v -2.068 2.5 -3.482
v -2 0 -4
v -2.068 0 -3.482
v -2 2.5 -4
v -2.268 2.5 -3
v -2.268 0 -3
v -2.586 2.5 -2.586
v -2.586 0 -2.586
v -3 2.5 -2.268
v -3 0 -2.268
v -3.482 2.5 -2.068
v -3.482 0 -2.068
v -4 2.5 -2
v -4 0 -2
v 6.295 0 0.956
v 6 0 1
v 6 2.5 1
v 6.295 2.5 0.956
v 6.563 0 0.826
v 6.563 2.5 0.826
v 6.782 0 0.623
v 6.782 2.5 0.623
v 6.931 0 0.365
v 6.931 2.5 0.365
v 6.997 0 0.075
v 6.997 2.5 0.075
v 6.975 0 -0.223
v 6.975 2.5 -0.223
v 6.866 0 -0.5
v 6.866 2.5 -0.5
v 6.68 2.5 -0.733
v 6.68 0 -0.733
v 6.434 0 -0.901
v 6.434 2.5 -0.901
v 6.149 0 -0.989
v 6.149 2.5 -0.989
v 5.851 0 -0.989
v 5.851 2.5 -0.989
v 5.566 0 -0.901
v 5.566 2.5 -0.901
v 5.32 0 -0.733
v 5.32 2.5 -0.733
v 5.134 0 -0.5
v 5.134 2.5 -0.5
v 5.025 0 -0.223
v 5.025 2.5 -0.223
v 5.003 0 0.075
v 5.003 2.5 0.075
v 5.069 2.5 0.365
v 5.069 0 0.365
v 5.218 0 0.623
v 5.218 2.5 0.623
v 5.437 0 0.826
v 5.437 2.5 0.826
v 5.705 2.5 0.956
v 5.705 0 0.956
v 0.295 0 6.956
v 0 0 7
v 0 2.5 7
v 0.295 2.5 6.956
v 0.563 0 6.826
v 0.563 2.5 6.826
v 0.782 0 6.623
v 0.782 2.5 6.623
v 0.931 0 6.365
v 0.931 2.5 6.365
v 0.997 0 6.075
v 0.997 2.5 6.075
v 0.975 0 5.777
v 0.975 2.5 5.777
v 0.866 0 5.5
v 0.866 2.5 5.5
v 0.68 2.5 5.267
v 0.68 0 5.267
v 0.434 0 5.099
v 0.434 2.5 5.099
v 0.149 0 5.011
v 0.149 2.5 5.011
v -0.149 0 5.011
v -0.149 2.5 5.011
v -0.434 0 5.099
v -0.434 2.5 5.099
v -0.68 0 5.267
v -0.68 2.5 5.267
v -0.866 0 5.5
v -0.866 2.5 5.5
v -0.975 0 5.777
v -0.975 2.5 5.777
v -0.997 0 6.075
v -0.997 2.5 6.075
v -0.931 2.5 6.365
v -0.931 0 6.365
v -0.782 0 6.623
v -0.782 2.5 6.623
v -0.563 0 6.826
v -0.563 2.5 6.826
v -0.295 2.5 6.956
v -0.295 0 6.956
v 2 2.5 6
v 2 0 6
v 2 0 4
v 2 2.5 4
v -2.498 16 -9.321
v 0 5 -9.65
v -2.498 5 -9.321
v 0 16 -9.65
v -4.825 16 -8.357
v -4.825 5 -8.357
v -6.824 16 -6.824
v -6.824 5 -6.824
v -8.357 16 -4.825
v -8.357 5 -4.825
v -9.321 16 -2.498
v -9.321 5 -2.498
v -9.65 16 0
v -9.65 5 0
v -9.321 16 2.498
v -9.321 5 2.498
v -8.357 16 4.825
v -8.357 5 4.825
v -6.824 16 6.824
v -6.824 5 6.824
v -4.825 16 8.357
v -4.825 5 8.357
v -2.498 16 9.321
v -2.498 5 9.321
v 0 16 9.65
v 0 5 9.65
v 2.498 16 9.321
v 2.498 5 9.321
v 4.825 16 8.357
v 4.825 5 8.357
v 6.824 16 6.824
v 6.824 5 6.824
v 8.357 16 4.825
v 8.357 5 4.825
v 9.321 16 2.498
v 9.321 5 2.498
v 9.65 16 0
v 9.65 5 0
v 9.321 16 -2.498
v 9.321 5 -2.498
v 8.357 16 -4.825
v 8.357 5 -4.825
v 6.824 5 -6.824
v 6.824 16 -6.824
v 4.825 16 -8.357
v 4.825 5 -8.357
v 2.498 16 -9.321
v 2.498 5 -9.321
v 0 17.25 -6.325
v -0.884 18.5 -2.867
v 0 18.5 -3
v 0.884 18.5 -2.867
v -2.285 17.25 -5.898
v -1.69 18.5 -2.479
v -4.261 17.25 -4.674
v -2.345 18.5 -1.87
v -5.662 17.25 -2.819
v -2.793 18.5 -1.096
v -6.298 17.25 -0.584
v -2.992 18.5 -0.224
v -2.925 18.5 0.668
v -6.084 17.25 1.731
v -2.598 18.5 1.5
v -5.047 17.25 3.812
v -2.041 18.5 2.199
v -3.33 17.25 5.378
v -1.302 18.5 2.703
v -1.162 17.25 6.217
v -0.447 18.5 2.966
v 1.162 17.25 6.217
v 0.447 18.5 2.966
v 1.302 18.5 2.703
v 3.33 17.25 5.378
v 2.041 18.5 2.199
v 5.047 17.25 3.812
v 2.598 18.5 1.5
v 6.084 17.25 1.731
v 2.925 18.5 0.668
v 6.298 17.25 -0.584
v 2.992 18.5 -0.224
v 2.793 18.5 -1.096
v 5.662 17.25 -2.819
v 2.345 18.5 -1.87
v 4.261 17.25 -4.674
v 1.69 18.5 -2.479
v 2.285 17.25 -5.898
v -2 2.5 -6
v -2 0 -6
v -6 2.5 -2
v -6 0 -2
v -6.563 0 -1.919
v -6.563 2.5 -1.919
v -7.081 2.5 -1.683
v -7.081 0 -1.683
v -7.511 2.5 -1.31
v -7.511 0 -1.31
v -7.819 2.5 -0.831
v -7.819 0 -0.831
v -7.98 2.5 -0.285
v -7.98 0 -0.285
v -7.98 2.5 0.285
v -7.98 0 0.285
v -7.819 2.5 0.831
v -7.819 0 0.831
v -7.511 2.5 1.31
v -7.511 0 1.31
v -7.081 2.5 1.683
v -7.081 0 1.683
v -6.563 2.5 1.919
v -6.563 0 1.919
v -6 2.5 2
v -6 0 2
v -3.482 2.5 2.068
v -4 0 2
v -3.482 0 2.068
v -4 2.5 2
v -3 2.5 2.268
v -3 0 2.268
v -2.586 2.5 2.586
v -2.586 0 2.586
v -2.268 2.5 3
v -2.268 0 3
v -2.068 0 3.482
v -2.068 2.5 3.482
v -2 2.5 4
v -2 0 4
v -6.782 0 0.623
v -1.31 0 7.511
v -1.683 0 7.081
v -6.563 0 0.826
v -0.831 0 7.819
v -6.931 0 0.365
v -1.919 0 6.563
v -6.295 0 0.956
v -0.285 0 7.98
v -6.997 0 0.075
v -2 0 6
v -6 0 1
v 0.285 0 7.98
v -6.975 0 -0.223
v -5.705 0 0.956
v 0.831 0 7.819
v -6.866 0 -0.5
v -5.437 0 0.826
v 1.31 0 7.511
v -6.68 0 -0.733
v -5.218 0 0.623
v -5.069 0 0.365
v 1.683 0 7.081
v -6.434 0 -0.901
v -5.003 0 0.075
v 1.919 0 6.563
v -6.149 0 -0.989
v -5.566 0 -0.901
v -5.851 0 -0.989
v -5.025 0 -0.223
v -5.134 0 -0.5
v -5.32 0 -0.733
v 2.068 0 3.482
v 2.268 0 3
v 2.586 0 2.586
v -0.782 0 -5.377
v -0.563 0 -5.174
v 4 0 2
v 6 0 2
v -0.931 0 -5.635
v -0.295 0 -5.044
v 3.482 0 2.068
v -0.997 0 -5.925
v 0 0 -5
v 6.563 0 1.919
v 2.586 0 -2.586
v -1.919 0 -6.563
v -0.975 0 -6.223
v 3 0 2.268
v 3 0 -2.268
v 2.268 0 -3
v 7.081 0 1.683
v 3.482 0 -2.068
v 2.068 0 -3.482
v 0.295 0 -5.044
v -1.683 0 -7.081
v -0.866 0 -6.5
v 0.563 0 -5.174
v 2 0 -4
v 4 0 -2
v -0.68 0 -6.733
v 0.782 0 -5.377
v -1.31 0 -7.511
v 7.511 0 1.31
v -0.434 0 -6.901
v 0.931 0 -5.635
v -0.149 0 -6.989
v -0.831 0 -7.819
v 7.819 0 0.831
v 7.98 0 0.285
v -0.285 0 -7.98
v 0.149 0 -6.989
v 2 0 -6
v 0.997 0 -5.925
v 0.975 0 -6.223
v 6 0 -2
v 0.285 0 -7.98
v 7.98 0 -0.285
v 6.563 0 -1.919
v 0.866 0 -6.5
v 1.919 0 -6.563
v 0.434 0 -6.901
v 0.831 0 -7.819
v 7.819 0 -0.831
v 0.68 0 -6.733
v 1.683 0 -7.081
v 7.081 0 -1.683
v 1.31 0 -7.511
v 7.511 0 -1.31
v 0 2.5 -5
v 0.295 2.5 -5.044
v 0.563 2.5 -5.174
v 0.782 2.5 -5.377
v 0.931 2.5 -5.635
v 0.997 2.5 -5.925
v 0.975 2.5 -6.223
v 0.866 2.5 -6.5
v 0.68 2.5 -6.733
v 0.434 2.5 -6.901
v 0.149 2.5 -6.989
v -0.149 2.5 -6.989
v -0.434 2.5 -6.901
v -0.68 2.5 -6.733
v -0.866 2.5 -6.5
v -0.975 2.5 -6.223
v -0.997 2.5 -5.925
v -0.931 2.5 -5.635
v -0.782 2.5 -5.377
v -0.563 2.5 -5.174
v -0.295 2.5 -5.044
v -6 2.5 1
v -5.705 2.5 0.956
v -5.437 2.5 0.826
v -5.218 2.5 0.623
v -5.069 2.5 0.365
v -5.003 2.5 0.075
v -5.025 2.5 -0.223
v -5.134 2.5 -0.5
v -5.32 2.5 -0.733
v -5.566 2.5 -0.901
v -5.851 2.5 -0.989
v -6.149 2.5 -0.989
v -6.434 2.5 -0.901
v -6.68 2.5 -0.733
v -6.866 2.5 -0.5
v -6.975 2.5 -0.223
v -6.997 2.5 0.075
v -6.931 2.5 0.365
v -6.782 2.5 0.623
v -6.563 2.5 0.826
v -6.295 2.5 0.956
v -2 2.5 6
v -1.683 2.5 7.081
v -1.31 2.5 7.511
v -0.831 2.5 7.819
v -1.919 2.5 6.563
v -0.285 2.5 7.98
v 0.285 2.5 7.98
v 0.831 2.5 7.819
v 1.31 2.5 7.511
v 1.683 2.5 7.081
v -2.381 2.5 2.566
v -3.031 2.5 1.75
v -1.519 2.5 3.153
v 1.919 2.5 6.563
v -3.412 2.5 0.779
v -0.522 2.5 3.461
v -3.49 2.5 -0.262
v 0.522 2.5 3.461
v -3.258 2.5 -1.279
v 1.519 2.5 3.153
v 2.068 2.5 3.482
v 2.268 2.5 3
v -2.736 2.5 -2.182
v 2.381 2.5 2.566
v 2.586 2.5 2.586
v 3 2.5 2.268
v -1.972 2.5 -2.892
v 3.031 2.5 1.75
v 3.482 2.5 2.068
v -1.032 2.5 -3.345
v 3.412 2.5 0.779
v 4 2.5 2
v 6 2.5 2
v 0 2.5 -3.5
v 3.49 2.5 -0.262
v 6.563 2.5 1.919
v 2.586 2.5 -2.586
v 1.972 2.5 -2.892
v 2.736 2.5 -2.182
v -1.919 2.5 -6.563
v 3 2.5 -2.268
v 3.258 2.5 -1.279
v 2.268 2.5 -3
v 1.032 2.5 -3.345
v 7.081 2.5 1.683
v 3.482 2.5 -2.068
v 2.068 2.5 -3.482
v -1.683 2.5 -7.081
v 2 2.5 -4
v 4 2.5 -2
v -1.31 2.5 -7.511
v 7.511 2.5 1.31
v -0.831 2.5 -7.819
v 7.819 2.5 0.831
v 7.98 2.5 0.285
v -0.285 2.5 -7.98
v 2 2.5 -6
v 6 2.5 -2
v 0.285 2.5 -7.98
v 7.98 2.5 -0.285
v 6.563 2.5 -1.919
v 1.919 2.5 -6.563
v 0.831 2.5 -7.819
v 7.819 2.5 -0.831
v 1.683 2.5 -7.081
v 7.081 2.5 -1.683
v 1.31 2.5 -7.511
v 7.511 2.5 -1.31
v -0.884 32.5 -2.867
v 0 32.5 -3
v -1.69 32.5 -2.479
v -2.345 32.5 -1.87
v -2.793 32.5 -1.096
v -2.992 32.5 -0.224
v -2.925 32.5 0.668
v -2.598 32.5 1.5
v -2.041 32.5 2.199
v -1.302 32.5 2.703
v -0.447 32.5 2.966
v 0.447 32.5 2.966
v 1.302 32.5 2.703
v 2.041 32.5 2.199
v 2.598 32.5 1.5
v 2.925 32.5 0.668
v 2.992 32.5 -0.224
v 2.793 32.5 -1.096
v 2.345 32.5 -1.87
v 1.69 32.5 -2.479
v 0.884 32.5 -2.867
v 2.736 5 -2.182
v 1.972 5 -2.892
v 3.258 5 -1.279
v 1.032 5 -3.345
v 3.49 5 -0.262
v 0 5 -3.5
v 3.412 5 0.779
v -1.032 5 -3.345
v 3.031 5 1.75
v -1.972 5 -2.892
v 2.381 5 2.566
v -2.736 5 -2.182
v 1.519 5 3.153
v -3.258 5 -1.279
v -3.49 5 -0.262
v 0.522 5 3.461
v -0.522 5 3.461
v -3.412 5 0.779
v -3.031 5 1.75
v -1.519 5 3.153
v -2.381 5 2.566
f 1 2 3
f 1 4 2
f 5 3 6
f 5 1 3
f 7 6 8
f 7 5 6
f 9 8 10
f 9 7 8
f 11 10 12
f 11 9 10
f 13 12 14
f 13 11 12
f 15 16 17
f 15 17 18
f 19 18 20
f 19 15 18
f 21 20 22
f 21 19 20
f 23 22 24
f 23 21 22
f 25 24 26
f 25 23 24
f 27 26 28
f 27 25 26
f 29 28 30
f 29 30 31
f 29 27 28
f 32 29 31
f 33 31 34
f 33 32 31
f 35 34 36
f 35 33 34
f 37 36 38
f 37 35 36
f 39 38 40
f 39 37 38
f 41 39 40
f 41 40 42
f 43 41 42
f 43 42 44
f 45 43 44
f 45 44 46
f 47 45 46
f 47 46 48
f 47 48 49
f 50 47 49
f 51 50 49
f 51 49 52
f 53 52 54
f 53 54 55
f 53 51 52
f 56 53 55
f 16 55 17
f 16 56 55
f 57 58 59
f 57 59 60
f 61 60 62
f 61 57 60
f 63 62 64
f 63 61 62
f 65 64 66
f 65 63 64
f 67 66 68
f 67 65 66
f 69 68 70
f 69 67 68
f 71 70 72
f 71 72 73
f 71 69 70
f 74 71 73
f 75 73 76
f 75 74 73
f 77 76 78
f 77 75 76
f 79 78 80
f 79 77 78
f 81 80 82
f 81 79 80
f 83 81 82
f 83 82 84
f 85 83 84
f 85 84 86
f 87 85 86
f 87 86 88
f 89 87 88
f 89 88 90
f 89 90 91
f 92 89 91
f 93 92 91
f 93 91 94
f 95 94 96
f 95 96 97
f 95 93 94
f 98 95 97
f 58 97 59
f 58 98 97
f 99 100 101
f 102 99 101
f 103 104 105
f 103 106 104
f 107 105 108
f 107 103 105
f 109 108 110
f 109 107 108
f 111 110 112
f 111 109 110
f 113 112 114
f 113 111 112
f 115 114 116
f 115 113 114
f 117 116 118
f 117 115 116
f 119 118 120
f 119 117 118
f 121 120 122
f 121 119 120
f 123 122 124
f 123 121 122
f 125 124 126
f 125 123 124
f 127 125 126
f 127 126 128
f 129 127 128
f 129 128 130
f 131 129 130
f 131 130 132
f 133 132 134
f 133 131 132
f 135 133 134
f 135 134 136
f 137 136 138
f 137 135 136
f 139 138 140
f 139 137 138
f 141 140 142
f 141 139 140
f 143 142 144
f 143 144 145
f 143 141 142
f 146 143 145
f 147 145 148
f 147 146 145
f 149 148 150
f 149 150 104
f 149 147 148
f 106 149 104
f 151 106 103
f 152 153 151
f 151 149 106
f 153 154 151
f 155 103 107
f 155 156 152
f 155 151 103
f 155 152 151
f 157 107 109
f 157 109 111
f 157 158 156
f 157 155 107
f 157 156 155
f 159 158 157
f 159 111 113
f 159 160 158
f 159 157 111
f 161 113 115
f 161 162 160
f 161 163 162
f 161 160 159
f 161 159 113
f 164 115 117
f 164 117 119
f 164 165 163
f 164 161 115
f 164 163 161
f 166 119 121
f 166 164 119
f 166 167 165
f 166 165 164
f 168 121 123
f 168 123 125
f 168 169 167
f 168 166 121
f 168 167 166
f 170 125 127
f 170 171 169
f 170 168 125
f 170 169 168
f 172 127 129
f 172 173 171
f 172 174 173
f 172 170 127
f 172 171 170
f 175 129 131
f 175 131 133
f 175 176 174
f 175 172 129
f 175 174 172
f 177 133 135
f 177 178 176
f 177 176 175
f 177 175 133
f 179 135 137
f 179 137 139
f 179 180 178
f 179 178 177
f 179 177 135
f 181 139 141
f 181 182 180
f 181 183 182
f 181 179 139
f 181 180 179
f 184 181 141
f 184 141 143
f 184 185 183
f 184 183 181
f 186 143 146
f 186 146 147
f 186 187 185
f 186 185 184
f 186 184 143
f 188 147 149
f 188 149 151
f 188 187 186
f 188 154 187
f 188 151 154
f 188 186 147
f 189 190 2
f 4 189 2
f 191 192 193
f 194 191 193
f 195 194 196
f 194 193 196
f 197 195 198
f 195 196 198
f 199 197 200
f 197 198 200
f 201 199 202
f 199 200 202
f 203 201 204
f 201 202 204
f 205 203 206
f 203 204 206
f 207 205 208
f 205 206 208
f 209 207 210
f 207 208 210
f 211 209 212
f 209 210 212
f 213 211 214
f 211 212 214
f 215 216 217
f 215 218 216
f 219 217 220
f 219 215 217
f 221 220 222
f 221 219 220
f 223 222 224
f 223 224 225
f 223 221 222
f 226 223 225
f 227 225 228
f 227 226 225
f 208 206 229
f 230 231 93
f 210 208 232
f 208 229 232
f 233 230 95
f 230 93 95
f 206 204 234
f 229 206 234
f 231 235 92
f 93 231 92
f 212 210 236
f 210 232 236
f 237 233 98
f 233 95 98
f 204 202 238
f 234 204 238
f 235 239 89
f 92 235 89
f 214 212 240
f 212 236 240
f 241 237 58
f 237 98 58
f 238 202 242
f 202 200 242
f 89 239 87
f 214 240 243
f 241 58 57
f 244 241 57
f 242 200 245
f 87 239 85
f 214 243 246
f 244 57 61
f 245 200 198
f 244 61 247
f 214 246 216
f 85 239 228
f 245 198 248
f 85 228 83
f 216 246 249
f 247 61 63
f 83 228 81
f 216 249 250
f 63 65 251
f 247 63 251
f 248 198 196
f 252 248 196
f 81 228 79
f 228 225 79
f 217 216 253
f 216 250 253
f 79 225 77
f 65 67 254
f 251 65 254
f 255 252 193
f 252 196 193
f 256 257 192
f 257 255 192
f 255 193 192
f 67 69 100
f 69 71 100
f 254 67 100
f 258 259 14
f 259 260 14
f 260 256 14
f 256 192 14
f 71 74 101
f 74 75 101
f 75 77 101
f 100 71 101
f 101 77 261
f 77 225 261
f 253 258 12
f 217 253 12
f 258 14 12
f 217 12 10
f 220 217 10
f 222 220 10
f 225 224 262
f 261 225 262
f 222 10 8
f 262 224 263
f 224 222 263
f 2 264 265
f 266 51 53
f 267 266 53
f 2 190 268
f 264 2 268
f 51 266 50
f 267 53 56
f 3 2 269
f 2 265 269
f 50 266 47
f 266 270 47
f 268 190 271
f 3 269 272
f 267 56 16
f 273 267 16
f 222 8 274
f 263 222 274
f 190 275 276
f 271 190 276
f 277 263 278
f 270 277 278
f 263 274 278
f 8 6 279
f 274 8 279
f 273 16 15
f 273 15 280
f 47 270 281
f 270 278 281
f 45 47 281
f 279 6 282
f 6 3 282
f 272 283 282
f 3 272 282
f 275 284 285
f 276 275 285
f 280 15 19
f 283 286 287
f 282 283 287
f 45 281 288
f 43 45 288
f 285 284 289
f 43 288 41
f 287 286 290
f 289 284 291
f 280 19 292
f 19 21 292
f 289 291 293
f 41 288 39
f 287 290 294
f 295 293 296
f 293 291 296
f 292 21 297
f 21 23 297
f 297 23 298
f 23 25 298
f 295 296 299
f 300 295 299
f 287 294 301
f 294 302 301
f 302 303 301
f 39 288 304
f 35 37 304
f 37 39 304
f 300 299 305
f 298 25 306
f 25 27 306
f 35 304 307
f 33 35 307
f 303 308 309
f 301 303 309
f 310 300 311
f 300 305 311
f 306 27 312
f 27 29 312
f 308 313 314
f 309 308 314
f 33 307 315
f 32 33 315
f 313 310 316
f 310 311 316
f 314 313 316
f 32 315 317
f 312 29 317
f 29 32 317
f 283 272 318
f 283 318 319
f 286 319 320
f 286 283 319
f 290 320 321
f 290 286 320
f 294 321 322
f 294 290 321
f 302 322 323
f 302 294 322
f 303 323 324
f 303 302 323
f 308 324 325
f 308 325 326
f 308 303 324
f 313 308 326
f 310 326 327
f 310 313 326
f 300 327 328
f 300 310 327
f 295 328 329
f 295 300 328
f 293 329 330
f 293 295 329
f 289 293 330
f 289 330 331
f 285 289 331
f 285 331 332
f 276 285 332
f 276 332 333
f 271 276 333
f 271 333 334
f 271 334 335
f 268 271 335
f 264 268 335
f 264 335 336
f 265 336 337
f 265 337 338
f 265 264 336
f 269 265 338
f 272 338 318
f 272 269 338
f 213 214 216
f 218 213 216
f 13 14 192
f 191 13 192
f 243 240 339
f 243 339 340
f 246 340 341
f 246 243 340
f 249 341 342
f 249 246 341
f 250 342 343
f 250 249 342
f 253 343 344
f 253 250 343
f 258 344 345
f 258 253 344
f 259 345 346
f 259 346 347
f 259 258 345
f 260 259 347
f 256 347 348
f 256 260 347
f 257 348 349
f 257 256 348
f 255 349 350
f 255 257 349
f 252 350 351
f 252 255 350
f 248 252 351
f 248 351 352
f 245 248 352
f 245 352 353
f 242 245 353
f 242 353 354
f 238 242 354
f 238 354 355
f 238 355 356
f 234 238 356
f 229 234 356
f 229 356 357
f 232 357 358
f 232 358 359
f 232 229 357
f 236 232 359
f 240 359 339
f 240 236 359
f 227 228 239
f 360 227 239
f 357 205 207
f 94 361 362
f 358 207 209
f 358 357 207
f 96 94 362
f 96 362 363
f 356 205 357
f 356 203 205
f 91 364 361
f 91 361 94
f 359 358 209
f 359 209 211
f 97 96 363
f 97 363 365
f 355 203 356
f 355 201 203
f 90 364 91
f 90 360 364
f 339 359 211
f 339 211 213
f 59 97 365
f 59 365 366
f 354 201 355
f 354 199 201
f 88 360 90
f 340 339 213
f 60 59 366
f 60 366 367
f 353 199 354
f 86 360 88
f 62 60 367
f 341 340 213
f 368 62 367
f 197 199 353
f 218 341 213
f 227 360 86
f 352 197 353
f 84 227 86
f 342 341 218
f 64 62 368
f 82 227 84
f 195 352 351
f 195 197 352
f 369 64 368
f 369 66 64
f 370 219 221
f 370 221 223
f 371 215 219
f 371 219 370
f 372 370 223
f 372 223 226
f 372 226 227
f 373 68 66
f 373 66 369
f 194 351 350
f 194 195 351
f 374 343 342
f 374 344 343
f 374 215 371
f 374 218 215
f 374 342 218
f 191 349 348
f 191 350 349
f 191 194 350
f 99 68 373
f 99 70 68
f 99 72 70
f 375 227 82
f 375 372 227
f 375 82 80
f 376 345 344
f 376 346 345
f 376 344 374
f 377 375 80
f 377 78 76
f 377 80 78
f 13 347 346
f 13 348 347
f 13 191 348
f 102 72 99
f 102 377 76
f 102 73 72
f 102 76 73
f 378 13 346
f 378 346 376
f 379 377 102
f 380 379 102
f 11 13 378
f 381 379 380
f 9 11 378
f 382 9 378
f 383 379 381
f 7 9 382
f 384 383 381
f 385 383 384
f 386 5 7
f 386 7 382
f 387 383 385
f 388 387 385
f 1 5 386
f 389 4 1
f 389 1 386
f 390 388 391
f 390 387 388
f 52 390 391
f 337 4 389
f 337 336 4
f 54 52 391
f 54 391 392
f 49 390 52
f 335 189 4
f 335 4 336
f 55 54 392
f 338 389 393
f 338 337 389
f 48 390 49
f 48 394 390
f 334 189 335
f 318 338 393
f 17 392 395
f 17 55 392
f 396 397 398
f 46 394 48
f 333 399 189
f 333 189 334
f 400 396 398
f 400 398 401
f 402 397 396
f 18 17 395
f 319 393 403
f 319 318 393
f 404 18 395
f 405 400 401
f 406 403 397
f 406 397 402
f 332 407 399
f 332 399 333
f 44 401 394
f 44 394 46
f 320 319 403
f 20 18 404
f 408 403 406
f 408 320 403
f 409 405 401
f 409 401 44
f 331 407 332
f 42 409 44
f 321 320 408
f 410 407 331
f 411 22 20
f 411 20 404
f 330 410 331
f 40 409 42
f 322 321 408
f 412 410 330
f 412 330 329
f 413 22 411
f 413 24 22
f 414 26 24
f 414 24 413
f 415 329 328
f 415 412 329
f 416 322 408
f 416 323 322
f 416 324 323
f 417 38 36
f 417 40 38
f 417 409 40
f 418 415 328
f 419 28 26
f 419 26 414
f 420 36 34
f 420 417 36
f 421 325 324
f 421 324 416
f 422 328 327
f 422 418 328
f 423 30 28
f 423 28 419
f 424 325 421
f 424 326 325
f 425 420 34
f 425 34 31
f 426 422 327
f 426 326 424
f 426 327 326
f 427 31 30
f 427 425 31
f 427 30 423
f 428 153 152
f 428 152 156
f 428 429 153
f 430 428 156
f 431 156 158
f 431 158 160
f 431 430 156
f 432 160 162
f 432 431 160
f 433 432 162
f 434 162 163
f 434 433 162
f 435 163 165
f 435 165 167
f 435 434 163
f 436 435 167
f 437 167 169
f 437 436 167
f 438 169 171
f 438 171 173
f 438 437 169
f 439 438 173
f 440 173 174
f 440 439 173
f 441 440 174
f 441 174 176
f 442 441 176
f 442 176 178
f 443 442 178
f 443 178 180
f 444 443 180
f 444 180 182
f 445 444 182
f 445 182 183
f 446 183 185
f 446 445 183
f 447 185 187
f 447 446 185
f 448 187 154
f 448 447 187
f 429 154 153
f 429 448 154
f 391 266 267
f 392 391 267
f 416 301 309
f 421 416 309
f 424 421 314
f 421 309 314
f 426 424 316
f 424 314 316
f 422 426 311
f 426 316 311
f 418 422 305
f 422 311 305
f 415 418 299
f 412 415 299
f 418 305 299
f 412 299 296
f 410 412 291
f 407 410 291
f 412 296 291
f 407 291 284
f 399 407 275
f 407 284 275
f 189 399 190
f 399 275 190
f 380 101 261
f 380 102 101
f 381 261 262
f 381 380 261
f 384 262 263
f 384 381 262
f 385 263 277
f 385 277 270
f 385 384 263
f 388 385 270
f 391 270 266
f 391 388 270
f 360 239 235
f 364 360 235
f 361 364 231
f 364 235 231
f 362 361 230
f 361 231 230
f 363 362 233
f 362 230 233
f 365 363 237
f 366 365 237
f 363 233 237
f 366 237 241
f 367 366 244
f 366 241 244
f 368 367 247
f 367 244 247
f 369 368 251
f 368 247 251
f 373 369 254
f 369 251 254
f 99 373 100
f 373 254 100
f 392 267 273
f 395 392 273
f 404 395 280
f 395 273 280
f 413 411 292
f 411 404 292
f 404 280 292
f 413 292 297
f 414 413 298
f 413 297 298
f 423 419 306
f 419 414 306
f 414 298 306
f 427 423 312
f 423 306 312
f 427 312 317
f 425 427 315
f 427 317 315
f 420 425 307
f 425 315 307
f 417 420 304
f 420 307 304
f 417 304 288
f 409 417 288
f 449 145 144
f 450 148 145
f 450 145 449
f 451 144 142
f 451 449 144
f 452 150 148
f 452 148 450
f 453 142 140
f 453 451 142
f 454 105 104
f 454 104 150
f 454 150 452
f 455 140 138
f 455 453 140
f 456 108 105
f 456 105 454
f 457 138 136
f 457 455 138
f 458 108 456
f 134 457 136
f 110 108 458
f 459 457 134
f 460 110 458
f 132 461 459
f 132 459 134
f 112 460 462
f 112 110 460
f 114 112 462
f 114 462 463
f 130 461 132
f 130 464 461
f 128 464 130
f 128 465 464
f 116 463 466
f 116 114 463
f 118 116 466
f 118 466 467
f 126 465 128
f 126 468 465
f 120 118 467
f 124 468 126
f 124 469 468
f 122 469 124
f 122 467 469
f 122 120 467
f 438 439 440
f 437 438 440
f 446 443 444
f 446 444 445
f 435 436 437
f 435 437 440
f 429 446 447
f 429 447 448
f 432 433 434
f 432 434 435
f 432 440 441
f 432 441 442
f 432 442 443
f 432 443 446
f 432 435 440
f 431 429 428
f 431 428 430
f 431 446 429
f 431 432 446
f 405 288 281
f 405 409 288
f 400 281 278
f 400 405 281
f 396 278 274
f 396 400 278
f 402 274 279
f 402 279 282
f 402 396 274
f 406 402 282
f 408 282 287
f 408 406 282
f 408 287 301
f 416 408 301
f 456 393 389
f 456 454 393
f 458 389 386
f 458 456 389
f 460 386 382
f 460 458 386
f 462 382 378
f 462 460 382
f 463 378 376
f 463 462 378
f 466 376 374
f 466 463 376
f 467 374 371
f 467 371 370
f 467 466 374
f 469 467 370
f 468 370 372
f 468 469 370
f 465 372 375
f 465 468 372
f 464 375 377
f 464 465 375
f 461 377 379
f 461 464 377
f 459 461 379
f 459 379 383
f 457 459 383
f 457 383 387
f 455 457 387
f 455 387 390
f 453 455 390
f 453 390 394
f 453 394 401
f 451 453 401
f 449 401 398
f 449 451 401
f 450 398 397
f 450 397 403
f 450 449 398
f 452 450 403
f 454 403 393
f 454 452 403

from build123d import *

# Parameters (mm, degrees)
SKETCH1_W           = 4
SKETCH1_H           = 4
SKETCH1_R           = 2
SKETCH1_R_2         = 1
BOSS_EXTRUDE1_DEPTH = 2.5
FILLET1_R           = 2


with BuildPart() as part:
    # Sketch1 → Boss-Extrude1 (new body)
    # profile 1 of 9: a face of its own
    with BuildSketch(Plane(origin=(0, 0, 0), x_dir=(1, 0, 0), z_dir=(0, 1, 0))):
        Rectangle(SKETCH1_W, SKETCH1_H)
    # profile 2 of 9: a face of its own
    with BuildSketch(Plane(origin=(0, 0, 0), x_dir=(1, 0, 0), z_dir=(0, 1, 0))):
        with BuildLine():
            ThreePointArc((-4, 0), (-4.585786438, -1.414213562), (-6, -2))
            Line((-6, -2), (-2, -2))
            Line((-2, -2), (-2, 2))
            Line((-2, 2), (-6, 2))
            ThreePointArc((-6, 2), (-4.585786438, 1.414213562), (-4, 0))
        make_face()
    # profile 3 of 9: a face of its own
    with BuildSketch(Plane(origin=(0, 0, 0), x_dir=(1, 0, 0), z_dir=(0, 1, 0))):
        with Locations((-6, 0)):
            Circle(SKETCH1_R)
        with Locations(Location((-6, 0, 0), (0, 0, 270))):
            Circle(SKETCH1_R_2, mode=Mode.SUBTRACT)
    # profile 4 of 9: a face of its own
    with BuildSketch(Plane(origin=(0, 0, 0), x_dir=(1, 0, 0), z_dir=(0, 1, 0))):
        with Locations((0, -6)):
            Circle(SKETCH1_R)
        with Locations(Location((0, -6, 0), (0, 0, 270))):
            Circle(SKETCH1_R_2, mode=Mode.SUBTRACT)
    # profile 5 of 9: a face of its own
    with BuildSketch(Plane(origin=(0, 0, 0), x_dir=(1, 0, 0), z_dir=(0, 1, 0))):
        with BuildLine():
            Line((2, -2), (-2, -2))
            Line((-2, -2), (-2, -6))
            ThreePointArc((-2, -6), (0, -4), (2, -6))
            Line((2, -6), (2, -2))
        make_face()
    # profile 6 of 9: a face of its own
    with BuildSketch(Plane(origin=(0, 0, 0), x_dir=(1, 0, 0), z_dir=(0, 1, 0))):
        with BuildLine():
            Line((-2, 6), (-2, 2))
            Line((-2, 2), (2, 2))
            Line((2, 2), (2, 6))
            ThreePointArc((2, 6), (0, 4), (-2, 6))
        make_face()
    # profile 7 of 9: a face of its own
    with BuildSketch(Plane(origin=(0, 0, 0), x_dir=(1, 0, 0), z_dir=(0, 1, 0))):
        with Locations((0, 6)):
            Circle(SKETCH1_R)
        with Locations(Location((0, 6, 0), (0, 0, 270))):
            Circle(SKETCH1_R_2, mode=Mode.SUBTRACT)
    # profile 8 of 9: a face of its own
    with BuildSketch(Plane(origin=(0, 0, 0), x_dir=(1, 0, 0), z_dir=(0, 1, 0))):
        with BuildLine():
            Line((2, 2), (2, -2))
            Line((2, -2), (6, -2))
            ThreePointArc((6, -2), (4, 0), (6, 2))
            Line((6, 2), (2, 2))
        make_face()
    # profile 9 of 9: a face of its own
    with BuildSketch(Plane(origin=(0, 0, 0), x_dir=(1, 0, 0), z_dir=(0, 1, 0))):
        with Locations((6, 0)):
            Circle(SKETCH1_R)
        with Locations(Location((6, 0, 0), (0, 0, 270))):
            Circle(SKETCH1_R_2, mode=Mode.SUBTRACT)
    extrude(amount=BOSS_EXTRUDE1_DEPTH)

    # Fillet1
    fillet1_edges = [part.edges().sort_by_distance(p)[0] for p in [
        (-2, 1.25, -2),
        (2, 1.25, -2),
        (2, 1.25, 2),
        (-2, 1.25, 2),
    ]]
    fillet(fillet1_edges, radius=FILLET1_R)

    # Sketch3 → Revolve1 (revolve)
    with BuildSketch(Plane.XY, mode=Mode.PRIVATE) as revolve1_sk:
        Polygon((0, 2.5), (3.5, 2.5), (3.5, 5), (9.65, 5), (9.65, 16), (3, 18.5), (3, 32.5), (0, 32.5), align=None)
    revolve(revolve1_sk.sketch.rotate(Axis((0, 2.5, 0), (0, 1, 0)), 90), axis=Axis((0, 2.5, 0), (0, 1, 0)))


solid = part.part
